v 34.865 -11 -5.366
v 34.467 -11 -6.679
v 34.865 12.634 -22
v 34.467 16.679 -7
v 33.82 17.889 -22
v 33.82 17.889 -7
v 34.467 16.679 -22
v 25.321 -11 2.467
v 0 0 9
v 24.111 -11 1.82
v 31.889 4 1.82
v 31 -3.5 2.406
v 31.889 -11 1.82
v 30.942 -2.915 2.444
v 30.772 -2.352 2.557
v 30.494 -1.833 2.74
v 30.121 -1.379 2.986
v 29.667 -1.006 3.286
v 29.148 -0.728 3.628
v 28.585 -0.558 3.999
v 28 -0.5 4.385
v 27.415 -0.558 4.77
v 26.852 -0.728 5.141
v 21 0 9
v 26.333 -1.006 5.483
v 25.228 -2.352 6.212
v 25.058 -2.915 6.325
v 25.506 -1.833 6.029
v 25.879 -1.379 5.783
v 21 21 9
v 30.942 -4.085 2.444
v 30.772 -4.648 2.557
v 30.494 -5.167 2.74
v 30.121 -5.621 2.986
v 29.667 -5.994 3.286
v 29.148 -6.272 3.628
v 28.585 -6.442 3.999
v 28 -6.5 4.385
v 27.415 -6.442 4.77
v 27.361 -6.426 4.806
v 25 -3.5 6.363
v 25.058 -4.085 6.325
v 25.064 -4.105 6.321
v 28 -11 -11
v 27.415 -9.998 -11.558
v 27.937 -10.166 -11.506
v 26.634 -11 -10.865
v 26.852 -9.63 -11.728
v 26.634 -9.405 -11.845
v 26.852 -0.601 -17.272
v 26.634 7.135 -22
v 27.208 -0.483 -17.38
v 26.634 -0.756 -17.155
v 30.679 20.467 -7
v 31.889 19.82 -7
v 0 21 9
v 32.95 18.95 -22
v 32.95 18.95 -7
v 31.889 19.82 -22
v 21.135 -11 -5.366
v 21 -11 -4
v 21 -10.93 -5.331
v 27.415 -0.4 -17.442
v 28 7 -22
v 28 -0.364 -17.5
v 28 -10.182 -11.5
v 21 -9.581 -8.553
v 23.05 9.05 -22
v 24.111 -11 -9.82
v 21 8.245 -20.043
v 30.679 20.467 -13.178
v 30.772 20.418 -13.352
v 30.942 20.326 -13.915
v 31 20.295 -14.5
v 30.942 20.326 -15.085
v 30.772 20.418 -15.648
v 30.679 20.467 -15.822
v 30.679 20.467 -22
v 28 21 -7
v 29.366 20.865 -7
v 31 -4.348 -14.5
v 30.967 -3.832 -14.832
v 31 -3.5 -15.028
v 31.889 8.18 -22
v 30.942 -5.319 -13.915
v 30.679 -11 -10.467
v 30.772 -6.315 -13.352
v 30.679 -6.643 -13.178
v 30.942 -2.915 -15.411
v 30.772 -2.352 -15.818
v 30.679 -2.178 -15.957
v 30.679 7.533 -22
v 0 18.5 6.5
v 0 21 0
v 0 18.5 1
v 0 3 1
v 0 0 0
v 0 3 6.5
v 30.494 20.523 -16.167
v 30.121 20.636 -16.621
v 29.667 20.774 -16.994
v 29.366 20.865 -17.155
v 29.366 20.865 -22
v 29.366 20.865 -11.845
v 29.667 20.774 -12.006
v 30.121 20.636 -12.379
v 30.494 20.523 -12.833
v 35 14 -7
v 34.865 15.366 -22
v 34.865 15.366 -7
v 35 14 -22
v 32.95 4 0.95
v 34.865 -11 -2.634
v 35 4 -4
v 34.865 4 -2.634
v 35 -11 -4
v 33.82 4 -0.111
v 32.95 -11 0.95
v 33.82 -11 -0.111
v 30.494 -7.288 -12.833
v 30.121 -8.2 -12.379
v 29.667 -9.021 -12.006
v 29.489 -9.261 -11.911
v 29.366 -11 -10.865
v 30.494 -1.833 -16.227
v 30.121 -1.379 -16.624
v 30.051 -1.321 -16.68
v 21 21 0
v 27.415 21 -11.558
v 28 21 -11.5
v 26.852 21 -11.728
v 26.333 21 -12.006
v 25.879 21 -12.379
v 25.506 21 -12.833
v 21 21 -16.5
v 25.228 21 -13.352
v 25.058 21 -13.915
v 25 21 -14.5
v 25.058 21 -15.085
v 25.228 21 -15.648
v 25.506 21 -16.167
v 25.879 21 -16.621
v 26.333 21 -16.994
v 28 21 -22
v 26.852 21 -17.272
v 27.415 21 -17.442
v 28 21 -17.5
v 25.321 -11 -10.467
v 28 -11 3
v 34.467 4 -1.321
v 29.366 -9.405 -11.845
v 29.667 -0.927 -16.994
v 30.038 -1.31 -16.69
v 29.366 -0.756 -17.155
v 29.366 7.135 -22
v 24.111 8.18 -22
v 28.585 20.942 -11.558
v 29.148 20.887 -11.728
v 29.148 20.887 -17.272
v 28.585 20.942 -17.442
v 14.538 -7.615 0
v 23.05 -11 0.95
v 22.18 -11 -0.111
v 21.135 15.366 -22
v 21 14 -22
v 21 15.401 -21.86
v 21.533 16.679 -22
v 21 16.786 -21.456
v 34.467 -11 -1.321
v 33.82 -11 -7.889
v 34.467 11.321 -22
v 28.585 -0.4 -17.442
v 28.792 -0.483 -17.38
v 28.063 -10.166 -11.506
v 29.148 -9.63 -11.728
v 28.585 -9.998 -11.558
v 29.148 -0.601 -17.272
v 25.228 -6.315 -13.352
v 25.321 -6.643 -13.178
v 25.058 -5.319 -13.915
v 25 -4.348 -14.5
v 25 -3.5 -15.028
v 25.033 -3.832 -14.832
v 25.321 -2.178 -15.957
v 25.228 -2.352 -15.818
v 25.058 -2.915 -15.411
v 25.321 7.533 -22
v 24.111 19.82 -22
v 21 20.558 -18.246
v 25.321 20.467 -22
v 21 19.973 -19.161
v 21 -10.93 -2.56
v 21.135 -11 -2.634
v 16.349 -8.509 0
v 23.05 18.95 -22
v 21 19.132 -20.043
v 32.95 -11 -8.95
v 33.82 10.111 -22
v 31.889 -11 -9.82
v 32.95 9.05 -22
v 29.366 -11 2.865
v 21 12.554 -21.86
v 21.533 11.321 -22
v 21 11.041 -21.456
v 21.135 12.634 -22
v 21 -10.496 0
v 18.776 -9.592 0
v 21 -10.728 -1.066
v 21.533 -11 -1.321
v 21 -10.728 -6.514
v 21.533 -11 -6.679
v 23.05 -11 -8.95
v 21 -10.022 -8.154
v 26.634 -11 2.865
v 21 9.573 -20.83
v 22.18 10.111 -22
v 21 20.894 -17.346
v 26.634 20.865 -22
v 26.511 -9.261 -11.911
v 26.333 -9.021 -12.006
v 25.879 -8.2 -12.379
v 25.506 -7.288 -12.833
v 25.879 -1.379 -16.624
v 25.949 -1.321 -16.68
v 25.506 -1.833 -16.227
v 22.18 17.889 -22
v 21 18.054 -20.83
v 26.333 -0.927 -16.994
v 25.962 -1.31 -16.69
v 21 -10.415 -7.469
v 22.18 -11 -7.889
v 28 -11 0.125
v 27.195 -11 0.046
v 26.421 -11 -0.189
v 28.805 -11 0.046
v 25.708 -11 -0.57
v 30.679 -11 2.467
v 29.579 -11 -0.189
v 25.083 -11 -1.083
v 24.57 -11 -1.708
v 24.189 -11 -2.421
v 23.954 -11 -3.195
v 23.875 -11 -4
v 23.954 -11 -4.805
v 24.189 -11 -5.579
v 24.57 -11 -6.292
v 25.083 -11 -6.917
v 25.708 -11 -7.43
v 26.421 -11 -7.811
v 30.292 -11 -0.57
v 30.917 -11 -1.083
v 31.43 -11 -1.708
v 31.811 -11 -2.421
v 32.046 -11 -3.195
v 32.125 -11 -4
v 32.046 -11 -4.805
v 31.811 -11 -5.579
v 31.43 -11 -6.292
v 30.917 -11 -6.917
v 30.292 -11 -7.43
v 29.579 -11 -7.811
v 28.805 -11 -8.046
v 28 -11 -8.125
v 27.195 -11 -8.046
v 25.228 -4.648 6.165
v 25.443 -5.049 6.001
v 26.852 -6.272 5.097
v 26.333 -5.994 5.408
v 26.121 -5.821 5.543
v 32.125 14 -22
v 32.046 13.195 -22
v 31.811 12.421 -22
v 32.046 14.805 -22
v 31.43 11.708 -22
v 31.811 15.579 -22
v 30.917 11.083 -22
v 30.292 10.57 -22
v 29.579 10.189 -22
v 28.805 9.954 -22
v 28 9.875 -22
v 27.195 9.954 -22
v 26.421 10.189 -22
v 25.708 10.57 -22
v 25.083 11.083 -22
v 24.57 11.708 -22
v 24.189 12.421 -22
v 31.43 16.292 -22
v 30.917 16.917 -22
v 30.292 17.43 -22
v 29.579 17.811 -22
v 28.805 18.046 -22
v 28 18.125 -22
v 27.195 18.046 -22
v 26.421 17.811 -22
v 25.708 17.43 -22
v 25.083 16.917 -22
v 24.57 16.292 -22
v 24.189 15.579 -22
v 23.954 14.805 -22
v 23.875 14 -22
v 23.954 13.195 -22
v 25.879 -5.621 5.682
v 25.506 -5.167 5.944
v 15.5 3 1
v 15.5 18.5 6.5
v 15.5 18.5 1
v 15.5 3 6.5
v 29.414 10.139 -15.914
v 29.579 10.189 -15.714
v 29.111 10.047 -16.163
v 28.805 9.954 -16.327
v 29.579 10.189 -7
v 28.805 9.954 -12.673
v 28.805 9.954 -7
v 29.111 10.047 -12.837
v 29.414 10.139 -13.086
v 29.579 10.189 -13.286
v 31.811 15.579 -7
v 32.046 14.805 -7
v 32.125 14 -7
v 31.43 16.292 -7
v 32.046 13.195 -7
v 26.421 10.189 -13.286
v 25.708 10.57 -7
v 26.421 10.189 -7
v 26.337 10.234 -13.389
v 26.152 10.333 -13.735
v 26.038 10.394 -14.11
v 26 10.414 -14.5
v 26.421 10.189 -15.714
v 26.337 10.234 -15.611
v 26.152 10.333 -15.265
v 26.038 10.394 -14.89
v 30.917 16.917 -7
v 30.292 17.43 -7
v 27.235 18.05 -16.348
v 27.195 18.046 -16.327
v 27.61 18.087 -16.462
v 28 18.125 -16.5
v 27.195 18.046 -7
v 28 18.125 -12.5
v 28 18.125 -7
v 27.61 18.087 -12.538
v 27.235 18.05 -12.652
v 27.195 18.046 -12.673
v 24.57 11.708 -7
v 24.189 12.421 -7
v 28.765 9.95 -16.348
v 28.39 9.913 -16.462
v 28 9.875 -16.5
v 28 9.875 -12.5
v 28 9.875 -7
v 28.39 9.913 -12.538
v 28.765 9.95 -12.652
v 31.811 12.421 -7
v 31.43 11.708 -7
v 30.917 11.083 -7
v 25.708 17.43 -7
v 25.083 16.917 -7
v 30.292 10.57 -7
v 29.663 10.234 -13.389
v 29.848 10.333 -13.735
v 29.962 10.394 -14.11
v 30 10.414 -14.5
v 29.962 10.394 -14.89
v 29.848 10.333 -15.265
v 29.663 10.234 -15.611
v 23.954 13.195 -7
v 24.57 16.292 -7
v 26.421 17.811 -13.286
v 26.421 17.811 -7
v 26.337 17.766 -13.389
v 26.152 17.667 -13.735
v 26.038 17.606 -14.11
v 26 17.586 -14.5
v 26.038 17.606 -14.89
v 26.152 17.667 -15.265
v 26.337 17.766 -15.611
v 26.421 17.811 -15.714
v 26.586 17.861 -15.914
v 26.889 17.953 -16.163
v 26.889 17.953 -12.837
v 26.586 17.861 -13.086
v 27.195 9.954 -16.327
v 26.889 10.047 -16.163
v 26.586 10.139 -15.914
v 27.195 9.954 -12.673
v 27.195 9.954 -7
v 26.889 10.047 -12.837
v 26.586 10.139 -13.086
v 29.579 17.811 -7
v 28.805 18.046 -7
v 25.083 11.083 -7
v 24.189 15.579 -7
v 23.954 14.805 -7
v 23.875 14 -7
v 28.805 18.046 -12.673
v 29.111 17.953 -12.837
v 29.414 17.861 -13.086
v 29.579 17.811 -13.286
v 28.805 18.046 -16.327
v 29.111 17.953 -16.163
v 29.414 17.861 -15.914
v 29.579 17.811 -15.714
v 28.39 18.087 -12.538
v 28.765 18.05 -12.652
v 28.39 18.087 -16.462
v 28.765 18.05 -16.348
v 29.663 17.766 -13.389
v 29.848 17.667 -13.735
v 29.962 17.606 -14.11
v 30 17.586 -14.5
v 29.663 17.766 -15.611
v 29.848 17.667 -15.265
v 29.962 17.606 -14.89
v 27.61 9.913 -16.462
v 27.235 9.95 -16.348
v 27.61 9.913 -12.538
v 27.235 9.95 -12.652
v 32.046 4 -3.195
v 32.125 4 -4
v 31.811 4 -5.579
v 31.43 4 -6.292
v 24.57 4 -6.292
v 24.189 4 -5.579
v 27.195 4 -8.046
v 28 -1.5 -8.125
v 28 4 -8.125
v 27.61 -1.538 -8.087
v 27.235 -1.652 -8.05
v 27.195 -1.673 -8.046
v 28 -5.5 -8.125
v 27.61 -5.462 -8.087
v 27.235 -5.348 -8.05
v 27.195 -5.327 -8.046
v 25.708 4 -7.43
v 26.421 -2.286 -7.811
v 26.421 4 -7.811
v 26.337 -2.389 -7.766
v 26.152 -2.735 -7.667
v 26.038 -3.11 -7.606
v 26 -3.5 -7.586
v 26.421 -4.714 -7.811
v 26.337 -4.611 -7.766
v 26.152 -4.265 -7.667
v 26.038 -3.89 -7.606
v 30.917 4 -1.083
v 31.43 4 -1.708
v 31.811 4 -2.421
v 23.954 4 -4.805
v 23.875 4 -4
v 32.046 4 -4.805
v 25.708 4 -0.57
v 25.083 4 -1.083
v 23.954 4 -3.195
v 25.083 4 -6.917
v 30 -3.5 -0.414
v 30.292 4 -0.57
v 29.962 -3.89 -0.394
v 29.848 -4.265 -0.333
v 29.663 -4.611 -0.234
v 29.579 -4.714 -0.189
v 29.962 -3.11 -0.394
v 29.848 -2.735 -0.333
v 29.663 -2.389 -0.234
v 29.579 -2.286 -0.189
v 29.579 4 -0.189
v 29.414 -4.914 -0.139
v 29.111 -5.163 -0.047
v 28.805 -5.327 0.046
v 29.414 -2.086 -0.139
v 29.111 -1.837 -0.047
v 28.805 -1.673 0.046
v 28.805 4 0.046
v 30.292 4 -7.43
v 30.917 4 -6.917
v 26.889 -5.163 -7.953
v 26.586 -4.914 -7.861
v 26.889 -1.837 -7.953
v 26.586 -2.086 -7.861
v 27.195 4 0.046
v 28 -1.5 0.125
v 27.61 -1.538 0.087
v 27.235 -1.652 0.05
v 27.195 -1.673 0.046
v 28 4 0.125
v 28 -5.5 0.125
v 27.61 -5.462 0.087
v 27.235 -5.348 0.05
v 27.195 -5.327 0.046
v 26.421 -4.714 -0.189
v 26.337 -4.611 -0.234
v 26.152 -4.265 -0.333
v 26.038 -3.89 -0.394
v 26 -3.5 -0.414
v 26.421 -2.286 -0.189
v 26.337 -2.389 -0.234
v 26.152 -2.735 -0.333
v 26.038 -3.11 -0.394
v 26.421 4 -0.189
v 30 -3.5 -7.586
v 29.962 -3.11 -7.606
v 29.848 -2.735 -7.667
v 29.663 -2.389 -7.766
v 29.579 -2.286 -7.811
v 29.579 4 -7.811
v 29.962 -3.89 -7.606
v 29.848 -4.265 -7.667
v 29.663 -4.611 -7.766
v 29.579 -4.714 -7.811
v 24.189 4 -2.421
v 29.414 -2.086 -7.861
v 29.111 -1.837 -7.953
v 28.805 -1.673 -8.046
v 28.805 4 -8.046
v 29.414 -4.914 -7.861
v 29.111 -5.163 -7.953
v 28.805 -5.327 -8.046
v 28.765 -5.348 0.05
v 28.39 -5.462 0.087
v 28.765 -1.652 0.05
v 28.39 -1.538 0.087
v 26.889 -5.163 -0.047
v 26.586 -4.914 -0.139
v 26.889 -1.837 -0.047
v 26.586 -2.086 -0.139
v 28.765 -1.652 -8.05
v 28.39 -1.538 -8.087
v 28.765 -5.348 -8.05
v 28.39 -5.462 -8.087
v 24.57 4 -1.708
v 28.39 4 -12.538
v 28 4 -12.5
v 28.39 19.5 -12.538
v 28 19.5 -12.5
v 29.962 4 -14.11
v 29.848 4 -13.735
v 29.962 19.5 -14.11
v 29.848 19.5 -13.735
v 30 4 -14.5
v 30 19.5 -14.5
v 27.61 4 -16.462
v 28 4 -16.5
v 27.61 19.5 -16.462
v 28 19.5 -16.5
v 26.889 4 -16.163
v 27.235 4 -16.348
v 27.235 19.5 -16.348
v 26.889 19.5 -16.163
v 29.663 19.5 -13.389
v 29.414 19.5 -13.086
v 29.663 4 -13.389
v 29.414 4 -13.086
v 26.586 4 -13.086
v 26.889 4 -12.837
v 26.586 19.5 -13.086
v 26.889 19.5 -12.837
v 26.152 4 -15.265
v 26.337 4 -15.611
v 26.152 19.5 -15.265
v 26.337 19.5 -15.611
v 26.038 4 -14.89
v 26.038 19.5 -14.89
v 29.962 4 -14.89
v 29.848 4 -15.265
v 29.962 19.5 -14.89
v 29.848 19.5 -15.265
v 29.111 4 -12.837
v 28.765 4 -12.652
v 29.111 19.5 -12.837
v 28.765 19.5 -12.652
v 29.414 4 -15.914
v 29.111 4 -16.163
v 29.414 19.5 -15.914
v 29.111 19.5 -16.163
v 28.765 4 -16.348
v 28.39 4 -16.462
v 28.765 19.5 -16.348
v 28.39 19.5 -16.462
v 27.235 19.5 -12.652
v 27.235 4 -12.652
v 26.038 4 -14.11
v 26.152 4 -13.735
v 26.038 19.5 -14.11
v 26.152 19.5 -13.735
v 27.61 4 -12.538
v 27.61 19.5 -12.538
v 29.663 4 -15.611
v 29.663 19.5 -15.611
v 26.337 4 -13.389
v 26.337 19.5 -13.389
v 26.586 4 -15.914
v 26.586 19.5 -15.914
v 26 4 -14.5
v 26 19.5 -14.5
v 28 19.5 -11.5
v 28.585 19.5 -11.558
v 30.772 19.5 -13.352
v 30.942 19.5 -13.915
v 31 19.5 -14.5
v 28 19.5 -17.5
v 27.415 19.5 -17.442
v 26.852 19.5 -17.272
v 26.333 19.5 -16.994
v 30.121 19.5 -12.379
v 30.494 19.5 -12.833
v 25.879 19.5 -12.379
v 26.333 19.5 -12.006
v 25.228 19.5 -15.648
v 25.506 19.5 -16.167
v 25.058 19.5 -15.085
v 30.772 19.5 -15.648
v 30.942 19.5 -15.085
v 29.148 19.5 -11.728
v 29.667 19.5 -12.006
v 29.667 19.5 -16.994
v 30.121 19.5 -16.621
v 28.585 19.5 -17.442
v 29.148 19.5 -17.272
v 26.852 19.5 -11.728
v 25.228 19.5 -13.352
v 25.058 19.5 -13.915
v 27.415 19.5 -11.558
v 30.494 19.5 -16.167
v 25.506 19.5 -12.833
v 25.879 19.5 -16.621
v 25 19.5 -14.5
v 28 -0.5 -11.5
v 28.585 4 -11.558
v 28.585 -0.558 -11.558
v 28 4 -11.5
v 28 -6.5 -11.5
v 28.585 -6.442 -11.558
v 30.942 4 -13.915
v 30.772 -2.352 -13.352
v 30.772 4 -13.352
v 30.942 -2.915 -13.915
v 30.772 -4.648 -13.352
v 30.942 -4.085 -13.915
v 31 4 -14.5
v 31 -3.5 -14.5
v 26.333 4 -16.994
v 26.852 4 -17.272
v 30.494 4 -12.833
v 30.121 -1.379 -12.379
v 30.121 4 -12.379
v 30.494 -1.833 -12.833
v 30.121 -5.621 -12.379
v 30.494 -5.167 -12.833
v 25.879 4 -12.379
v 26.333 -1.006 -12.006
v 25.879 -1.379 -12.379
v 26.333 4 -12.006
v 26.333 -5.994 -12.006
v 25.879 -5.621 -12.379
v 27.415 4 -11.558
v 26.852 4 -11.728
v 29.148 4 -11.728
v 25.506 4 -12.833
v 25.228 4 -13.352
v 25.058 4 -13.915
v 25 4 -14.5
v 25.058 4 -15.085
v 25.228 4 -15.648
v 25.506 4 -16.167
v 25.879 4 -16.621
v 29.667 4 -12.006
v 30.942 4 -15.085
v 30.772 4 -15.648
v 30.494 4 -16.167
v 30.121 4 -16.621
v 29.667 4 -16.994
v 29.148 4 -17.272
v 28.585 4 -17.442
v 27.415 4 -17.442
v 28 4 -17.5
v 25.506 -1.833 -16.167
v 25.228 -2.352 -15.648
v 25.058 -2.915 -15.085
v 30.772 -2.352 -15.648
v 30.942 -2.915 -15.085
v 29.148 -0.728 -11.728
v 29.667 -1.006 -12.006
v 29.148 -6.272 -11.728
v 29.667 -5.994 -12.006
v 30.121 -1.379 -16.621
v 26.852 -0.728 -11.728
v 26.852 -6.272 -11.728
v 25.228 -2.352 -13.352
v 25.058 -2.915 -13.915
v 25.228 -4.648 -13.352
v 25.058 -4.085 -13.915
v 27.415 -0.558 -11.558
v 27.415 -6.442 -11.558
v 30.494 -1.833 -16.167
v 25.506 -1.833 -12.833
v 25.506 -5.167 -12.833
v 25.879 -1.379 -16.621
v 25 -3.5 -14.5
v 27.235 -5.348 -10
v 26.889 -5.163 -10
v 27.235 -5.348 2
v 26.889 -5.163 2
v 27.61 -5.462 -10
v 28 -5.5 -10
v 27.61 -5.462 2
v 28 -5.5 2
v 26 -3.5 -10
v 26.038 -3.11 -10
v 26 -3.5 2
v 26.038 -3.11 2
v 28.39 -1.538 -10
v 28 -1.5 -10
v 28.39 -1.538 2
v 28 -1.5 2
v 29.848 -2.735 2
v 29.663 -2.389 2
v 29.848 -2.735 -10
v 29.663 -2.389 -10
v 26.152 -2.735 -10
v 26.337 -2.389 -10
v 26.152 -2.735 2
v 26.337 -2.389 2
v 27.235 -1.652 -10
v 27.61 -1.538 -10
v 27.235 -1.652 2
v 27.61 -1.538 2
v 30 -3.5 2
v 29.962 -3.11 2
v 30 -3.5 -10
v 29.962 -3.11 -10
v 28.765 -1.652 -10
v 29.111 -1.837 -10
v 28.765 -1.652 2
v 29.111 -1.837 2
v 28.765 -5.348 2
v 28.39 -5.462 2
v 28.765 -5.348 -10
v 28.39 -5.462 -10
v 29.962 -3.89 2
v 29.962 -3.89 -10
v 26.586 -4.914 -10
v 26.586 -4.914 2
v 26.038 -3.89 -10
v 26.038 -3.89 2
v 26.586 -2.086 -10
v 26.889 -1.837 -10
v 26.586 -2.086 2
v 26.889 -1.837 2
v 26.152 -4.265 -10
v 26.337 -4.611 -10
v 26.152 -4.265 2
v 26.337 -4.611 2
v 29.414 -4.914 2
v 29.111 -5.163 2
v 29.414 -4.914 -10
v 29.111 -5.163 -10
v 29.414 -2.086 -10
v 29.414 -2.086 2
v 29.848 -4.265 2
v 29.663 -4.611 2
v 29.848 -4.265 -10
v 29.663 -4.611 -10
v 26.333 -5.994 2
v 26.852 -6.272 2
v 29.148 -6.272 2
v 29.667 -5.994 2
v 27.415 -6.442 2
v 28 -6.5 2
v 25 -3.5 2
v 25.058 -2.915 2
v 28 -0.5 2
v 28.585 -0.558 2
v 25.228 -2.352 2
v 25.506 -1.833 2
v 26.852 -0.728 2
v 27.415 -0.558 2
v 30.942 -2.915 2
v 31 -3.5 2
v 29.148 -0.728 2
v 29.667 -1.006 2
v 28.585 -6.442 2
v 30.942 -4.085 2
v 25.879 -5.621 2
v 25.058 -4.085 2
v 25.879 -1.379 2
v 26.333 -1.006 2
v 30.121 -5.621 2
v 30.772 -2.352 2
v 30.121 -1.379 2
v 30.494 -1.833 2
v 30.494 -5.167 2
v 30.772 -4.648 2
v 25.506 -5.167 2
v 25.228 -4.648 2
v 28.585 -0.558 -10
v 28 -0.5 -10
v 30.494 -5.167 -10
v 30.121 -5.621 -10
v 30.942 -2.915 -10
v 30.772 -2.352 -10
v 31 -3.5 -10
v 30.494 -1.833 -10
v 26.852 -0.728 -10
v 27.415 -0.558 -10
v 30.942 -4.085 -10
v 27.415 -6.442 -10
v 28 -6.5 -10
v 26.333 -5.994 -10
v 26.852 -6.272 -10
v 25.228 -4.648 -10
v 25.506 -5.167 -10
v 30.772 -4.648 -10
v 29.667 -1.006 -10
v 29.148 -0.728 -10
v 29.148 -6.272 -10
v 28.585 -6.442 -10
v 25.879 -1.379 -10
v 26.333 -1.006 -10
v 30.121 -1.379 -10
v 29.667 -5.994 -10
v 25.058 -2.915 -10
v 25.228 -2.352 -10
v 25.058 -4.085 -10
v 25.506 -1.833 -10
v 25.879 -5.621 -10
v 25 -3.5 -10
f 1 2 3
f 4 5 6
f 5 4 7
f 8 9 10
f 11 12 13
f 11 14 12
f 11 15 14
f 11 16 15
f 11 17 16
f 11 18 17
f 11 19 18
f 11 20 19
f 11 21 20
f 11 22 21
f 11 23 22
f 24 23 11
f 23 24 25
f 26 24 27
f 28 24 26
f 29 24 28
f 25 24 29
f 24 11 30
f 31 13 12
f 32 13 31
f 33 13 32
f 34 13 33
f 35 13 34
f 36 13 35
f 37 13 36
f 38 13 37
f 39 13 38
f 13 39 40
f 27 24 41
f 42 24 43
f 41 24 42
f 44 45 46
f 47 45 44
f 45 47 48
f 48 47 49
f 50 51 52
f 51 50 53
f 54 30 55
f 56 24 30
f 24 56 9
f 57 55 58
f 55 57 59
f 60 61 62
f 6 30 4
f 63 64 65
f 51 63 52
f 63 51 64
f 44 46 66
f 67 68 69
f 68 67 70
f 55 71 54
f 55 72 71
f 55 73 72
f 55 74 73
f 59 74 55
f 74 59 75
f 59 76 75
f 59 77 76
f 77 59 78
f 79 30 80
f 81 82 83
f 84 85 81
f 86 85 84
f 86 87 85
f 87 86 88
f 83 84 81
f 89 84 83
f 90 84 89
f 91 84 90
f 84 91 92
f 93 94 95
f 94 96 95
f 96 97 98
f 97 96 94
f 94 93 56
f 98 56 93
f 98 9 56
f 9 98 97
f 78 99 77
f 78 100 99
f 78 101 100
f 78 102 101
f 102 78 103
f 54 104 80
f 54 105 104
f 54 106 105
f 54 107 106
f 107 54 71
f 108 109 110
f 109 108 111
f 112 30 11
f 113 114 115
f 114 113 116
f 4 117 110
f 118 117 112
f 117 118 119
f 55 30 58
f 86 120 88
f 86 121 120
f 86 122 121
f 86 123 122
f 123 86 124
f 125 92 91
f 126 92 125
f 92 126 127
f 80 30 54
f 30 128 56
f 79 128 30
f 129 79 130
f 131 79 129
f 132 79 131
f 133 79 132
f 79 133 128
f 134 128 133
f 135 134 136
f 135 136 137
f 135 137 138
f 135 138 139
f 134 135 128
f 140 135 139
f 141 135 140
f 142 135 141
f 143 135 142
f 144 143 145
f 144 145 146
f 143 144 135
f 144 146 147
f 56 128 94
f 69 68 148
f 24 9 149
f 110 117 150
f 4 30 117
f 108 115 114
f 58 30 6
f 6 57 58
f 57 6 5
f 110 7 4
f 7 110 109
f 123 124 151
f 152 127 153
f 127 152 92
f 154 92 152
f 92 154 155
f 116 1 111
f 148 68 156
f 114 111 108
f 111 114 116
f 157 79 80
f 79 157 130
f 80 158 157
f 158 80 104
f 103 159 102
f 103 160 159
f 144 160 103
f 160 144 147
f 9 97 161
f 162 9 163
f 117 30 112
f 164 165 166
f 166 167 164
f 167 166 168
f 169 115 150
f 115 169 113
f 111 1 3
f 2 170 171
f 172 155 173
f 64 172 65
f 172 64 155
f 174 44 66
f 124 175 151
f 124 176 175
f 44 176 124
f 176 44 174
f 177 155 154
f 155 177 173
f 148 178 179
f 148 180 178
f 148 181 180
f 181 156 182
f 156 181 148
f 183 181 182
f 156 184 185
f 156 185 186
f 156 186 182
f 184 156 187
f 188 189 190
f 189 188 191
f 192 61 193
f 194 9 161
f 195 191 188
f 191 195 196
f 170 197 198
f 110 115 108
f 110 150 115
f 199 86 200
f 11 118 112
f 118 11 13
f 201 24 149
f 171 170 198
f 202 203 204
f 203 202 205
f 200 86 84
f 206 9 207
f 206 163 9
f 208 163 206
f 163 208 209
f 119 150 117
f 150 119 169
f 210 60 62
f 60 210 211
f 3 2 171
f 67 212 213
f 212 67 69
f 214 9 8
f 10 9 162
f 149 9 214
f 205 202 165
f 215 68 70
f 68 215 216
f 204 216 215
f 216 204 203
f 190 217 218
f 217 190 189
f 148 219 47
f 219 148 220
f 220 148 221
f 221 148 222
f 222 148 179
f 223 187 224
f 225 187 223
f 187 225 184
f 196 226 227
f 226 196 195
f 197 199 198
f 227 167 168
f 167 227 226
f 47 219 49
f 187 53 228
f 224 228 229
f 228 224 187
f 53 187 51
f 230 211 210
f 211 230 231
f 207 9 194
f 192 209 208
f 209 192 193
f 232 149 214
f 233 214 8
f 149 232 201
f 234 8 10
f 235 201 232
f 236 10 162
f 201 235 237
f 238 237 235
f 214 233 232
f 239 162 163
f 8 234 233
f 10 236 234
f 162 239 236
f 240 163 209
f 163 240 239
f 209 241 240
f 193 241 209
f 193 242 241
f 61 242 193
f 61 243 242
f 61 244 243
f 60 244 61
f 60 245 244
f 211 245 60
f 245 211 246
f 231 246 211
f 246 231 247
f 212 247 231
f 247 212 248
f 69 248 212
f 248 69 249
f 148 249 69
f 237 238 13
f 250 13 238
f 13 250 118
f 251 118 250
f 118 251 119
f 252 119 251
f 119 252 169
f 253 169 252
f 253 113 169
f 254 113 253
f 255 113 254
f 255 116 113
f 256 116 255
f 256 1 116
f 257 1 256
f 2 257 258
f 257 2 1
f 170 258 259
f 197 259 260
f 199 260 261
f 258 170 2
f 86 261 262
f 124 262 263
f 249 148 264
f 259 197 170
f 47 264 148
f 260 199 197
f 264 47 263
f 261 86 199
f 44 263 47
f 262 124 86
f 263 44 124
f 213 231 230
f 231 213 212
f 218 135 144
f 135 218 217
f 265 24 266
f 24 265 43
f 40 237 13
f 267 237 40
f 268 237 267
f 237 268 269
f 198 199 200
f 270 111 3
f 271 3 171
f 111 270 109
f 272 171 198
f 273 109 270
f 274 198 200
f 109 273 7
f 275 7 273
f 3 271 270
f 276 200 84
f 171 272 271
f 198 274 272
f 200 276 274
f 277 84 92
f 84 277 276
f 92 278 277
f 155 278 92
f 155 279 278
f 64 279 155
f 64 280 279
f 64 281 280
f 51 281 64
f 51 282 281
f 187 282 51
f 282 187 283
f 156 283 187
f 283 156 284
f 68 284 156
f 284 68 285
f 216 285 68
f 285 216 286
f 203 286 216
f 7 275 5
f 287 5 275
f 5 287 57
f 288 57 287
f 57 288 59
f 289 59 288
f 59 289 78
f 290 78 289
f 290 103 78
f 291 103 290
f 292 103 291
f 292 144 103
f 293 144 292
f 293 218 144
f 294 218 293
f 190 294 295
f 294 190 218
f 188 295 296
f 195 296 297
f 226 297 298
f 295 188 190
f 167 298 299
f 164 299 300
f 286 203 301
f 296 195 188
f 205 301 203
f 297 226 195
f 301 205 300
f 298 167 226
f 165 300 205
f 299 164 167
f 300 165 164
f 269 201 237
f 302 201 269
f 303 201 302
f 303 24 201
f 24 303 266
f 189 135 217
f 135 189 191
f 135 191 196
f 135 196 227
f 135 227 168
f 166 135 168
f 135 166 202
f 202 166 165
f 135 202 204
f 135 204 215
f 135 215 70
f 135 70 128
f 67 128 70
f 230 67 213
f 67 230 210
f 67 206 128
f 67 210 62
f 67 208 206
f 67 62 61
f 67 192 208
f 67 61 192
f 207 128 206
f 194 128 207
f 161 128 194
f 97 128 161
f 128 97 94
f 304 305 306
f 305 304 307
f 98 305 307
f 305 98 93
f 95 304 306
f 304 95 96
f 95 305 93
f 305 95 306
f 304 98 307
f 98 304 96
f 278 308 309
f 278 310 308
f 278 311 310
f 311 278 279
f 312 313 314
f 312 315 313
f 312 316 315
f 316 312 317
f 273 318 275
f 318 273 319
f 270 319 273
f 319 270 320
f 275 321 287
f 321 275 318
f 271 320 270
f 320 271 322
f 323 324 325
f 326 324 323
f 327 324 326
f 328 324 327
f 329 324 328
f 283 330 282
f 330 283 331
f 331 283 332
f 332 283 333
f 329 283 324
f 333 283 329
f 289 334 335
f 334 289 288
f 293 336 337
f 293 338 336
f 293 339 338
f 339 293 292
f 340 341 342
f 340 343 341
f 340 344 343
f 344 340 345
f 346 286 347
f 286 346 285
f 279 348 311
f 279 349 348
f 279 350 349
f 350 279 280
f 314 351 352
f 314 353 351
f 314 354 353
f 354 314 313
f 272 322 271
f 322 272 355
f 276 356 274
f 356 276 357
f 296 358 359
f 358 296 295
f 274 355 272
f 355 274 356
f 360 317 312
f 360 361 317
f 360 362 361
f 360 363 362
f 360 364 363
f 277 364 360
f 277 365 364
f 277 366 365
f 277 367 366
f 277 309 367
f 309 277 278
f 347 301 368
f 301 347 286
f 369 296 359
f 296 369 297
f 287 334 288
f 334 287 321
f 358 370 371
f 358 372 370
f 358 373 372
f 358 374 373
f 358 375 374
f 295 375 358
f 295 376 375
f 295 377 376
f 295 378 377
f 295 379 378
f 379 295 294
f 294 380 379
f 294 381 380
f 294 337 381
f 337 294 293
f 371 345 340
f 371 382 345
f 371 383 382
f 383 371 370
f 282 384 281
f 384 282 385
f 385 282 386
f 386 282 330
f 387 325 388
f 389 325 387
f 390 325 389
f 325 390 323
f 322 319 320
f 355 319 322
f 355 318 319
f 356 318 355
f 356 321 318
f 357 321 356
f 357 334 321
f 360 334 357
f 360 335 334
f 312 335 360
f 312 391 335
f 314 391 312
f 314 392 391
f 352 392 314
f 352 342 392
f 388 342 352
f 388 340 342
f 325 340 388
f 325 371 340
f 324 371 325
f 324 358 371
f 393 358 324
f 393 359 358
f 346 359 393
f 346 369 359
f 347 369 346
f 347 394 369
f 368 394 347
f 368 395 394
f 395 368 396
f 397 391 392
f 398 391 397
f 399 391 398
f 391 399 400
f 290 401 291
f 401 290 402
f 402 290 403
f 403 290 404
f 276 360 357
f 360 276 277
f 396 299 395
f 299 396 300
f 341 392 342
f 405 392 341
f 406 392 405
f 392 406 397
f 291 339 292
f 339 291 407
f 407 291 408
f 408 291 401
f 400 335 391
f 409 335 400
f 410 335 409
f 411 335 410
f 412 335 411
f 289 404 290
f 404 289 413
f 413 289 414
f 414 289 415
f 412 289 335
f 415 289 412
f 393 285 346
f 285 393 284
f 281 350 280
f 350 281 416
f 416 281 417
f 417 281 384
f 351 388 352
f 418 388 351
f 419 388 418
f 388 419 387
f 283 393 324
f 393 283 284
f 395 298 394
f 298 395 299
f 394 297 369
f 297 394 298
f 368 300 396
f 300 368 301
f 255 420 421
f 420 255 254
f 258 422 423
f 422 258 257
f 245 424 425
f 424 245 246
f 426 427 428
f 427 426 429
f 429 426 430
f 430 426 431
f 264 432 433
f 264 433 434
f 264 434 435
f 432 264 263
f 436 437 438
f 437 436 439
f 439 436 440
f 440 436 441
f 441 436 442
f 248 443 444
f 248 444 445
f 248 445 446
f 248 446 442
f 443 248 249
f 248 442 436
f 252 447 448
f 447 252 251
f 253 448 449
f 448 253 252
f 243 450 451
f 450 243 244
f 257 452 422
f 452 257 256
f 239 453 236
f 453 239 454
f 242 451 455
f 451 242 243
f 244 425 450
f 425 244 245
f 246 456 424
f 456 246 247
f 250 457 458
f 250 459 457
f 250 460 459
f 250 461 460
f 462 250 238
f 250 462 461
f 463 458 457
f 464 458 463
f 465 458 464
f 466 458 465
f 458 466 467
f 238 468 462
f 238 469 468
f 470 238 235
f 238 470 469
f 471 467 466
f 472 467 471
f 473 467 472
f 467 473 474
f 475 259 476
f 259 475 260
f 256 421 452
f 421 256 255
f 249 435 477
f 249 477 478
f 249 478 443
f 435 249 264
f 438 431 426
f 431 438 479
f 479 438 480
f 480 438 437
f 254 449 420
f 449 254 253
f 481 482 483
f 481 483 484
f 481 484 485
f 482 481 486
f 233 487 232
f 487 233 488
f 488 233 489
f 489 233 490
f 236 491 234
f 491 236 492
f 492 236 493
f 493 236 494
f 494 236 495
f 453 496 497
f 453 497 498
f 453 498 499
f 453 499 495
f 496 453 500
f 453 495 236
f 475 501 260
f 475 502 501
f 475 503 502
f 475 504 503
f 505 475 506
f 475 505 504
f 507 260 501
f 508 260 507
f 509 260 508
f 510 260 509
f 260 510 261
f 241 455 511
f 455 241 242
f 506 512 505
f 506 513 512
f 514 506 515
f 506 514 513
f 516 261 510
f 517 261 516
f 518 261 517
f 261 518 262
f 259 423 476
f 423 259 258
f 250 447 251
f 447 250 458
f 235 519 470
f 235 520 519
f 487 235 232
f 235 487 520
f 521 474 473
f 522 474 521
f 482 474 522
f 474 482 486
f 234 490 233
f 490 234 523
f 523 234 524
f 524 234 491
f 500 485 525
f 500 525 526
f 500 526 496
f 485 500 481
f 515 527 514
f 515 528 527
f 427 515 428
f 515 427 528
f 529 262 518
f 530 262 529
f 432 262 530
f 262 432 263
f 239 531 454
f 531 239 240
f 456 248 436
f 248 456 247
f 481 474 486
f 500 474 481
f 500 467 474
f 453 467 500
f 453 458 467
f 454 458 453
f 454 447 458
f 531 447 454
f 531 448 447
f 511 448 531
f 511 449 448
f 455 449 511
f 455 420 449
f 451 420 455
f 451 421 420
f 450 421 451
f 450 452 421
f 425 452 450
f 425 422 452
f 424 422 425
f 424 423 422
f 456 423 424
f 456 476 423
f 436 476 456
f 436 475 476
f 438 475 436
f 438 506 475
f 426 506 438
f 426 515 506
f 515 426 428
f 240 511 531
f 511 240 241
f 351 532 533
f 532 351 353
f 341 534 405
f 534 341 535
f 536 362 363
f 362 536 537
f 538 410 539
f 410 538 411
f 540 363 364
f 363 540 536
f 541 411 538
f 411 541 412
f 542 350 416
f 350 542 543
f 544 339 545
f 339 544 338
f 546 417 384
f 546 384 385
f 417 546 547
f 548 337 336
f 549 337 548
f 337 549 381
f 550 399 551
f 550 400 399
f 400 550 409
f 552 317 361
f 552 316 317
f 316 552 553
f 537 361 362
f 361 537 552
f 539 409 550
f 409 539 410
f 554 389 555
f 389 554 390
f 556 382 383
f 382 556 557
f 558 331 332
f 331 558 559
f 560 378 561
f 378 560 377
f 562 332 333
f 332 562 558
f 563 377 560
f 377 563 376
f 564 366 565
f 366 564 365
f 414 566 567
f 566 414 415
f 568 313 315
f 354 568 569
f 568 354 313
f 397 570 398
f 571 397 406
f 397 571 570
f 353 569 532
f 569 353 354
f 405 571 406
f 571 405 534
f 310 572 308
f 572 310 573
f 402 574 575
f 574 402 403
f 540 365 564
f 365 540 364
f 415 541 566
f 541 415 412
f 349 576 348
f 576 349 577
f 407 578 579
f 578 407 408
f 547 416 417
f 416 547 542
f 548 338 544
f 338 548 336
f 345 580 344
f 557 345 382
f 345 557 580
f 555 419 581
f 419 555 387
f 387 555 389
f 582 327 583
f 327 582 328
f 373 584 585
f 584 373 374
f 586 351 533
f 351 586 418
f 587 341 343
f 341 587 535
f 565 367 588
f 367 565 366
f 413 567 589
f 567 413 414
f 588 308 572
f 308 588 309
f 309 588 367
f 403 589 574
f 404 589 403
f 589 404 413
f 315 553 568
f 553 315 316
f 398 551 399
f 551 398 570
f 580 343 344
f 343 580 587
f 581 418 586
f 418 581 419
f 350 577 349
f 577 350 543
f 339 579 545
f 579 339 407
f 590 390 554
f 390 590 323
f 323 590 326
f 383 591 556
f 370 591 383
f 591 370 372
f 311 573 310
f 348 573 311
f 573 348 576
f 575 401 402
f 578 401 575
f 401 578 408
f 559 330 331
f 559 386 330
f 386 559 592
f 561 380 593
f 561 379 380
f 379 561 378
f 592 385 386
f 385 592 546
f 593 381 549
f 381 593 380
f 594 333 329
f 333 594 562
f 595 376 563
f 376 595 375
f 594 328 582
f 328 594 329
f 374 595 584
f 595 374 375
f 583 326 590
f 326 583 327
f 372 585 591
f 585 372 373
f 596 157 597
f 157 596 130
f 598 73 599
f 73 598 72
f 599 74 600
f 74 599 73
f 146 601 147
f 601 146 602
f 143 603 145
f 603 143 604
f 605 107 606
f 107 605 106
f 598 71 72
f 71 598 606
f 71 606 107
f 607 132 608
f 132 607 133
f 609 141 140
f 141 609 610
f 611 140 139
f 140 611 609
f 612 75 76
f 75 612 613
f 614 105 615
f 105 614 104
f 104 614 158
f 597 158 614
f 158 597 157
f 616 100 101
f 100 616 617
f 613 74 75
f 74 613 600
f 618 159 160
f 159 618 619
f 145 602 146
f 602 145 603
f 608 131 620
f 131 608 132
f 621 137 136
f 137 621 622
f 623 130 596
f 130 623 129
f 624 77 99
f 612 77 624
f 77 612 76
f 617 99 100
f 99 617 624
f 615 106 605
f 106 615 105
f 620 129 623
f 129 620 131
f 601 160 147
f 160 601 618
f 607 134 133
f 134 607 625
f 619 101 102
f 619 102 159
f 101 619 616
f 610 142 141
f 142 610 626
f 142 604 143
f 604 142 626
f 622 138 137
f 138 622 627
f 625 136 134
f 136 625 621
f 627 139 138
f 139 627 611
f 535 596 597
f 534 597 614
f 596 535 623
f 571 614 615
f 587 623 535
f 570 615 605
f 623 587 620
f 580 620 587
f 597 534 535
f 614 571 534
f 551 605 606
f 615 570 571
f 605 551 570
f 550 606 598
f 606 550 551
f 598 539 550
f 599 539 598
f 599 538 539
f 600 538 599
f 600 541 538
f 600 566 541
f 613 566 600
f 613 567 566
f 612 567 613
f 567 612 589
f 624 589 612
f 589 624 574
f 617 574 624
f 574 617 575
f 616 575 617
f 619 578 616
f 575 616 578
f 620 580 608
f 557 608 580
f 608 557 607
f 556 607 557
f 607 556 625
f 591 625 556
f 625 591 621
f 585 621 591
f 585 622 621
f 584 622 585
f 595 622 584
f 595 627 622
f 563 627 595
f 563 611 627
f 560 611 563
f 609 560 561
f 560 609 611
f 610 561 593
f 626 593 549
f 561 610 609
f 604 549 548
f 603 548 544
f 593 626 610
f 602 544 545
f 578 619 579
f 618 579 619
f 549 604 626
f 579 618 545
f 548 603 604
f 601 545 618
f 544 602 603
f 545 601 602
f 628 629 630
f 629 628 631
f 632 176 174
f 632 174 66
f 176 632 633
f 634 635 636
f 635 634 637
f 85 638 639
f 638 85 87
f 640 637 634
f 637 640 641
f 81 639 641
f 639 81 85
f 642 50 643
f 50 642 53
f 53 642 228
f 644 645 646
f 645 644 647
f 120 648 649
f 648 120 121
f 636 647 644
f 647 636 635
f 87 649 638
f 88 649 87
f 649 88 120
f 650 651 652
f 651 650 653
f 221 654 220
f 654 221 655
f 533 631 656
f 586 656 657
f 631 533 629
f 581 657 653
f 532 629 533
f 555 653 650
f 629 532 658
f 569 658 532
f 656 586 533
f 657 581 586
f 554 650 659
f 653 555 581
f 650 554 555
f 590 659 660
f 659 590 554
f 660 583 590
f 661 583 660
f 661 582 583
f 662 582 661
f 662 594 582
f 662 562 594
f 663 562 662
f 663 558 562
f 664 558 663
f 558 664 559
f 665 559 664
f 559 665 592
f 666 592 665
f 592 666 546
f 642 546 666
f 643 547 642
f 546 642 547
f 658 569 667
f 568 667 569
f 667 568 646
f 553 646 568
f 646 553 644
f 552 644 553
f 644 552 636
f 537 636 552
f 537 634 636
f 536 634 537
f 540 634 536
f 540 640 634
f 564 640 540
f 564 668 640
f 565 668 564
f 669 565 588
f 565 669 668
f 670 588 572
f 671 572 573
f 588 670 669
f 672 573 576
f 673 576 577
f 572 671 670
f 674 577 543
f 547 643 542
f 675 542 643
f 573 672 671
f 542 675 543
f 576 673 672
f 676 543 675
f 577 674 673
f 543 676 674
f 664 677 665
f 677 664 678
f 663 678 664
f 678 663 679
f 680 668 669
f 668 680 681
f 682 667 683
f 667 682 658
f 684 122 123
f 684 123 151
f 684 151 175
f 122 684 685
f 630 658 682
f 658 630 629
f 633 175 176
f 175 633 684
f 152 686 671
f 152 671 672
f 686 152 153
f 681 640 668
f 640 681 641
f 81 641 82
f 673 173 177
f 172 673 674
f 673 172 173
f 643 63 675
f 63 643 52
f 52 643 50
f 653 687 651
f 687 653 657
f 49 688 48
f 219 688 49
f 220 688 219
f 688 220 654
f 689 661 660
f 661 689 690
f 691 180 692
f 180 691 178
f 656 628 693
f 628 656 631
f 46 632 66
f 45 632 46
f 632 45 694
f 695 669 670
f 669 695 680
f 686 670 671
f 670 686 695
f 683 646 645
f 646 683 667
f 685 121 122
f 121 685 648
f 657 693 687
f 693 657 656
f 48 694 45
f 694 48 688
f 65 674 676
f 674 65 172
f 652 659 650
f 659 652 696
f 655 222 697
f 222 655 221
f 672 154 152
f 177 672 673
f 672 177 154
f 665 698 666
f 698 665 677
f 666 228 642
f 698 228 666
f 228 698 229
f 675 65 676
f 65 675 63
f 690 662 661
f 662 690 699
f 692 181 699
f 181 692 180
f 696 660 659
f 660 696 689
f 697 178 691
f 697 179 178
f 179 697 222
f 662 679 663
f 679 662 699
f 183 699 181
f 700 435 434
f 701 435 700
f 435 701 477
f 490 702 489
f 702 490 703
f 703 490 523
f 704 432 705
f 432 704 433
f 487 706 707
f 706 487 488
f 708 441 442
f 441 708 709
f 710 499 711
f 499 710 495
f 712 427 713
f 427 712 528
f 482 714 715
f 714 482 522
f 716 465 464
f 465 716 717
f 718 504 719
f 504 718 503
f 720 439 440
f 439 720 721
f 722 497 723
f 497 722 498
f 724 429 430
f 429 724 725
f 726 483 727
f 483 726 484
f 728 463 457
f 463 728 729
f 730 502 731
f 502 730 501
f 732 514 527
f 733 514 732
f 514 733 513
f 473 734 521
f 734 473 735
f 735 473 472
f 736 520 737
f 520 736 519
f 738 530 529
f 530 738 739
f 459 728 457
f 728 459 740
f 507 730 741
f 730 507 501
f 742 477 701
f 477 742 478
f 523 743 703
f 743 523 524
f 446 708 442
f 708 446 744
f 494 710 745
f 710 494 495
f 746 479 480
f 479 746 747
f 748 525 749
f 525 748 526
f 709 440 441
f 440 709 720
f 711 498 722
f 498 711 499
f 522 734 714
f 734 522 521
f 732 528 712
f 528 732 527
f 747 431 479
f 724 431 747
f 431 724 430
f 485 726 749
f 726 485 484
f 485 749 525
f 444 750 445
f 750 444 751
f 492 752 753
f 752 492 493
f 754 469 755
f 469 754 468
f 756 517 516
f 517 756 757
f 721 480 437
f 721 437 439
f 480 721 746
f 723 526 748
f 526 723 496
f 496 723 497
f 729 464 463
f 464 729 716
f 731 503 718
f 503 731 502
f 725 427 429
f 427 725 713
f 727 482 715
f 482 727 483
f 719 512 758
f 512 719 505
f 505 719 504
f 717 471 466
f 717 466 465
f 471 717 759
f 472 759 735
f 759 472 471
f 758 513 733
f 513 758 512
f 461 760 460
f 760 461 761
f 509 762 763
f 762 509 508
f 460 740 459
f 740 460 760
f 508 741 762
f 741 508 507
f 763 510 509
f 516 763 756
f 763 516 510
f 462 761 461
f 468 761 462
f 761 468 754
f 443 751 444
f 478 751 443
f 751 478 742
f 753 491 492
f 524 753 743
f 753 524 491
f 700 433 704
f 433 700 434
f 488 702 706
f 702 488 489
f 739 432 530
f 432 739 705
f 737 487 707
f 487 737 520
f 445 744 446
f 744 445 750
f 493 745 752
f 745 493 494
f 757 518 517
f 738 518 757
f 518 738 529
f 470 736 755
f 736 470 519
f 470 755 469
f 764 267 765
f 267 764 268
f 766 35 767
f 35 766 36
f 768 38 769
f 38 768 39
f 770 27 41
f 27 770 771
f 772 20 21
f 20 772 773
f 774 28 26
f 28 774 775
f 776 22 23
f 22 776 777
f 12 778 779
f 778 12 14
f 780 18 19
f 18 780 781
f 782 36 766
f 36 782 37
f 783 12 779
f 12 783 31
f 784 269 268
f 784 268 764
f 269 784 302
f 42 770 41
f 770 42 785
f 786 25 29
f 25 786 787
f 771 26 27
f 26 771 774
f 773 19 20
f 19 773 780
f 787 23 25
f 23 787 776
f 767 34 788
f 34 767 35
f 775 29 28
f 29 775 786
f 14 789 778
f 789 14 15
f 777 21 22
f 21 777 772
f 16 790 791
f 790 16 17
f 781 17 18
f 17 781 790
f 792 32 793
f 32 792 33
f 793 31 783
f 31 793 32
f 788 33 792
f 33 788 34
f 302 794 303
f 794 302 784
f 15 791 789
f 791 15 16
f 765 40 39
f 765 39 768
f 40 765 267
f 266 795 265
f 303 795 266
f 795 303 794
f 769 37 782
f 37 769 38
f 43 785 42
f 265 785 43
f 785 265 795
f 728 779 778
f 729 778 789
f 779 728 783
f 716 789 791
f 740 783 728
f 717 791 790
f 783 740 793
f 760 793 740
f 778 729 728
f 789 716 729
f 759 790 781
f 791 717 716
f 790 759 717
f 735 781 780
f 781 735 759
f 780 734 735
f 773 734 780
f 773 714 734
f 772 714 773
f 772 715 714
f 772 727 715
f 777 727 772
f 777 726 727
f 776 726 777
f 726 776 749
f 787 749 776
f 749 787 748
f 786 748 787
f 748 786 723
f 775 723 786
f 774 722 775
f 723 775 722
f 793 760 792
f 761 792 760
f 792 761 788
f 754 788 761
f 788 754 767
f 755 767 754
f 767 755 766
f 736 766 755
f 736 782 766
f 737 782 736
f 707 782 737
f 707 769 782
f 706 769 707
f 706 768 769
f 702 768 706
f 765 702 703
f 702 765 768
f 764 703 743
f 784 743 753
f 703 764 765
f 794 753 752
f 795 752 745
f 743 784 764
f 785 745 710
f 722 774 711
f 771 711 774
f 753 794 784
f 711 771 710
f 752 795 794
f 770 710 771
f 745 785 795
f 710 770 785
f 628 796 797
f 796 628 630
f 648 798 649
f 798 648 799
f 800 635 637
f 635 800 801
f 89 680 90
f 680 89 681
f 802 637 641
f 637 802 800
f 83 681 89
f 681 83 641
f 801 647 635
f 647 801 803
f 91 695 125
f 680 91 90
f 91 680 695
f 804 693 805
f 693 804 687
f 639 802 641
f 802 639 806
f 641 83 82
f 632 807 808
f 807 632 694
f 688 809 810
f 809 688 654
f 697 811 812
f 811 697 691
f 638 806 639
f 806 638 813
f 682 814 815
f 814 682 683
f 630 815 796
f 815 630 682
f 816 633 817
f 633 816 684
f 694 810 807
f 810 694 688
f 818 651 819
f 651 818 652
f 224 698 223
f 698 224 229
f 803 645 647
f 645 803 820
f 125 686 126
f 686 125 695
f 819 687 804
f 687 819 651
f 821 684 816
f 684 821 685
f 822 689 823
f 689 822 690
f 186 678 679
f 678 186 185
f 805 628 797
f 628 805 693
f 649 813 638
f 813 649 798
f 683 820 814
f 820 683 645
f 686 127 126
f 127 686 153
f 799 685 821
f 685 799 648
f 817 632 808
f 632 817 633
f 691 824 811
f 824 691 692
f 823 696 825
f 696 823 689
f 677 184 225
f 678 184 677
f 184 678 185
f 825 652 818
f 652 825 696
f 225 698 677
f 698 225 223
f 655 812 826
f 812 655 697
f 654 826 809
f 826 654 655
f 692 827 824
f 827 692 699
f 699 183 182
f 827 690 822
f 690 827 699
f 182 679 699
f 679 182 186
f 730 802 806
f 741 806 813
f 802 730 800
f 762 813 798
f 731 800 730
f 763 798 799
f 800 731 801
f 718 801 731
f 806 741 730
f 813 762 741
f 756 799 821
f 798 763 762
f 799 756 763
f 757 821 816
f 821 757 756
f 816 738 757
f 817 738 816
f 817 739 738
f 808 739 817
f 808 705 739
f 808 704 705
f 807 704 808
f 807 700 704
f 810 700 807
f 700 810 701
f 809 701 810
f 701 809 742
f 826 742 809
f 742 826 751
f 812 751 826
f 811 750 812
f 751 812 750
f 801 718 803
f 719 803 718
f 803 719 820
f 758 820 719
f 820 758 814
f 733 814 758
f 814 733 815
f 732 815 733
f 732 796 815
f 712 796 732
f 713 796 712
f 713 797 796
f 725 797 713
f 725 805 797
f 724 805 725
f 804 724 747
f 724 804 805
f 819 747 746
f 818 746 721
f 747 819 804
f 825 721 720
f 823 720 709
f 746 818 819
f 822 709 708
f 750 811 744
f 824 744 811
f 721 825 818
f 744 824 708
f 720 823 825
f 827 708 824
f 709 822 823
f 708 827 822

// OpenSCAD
// Global constants
$fn=32;
D = 0.125;
D2 = D * 2;
D4 = D * 4;

// Input Parameters
magW = 15;
magH = 5;
wallW = 3;
tubeR = 4;
boltRadius = 2;
boltHeadRadius = 3;

// Selected module call
//hook(tubeR);
upperConnector(magW, magH, wallW, tubeR);
//lowerConnector(magW, magH, wallW, tubeR);

module lowerConnector(magnetWidth, magnetHeight, magnetWall, tubeRadius) {
    difference() {
        tubeShellW = 3;
        tubeHoleL = 10;
        magThinWallH = 1;
        hullShapeHeight = 1;
        magWithDoubleWall = magnetWidth + magnetWall * 2;
        tubeWithShell = tubeRadius + tubeShellW;
        
        hull() {
            // box for magnet
            cube([magWithDoubleWall, magWithDoubleWall, magnetHeight + magnetWall + magThinWallH]);
            
            // cyllinder box for tube #1
            translate([magWithDoubleWall, (magWithDoubleWall)/2, tubeWithShell])
                rotate([0, 90, 0])  {
                    cylinder(r=tubeWithShell, h=tubeHoleL);
                };
            // bottom shape for hull #1
            translate([magWithDoubleWall, 0, 0])
                cube([tubeHoleL, magWithDoubleWall, hullShapeHeight]);
                
            // cyllinder box for tube #2
            translate([(magWithDoubleWall)/2, magWithDoubleWall + tubeHoleL, tubeWithShell])
                rotate([90, 0, 0])  {
                    cylinder(r=tubeWithShell, h=tubeHoleL);
                };
            // bottom shape for hull #2
            translate([0, magWithDoubleWall, 0])
                cube([magWithDoubleWall, tubeHoleL, hullShapeHeight]);
        };
        
        // magnet hole
        translate([magnetWall, 0, magThinWallH])
            cube([magnetWidth + D4, magnetWidth + D4, magnetHeight + D4]);
        
        // tube hole #1
        translate([magWithDoubleWall, (magWithDoubleWall)/2, tubeWithShell])
            rotate([0, 90, 0])  {
                cylinder(r=tubeRadius + D, h=tubeHoleL);
            };
            
        // tube hole #2
        translate([(magWithDoubleWall)/2, magWithDoubleWall, tubeWithShell])
            rotate([-90, 0, 0])  {
                cylinder(r=tubeRadius + D, h=tubeHoleL);
            };
            
        // bolt hole #1
        translate([magWithDoubleWall + tubeHoleL/2, 0, tubeWithShell]) 
            rotate([-90, 0, 0]) {
                cylinder(r=boltRadius, h=1000);
            }
        // bolt header holes #1
        translate([magWithDoubleWall + tubeHoleL/2, 0, tubeWithShell]) 
            rotate([-90, 0, 0]) {
                cylinder(r=boltHeadRadius, h=3);
            }
        translate([magWithDoubleWall + tubeHoleL/2, magWithDoubleWall + tubeHoleL, tubeWithShell]) 
            rotate([90, 0, 0]) {
                cylinder(r=boltHeadRadius, h=12);
            }
        // bolt hole #2
        translate([0, magWithDoubleWall + tubeHoleL/2, tubeWithShell]) 
            rotate([0, 90, 0]) {
                cylinder(r=boltRadius, h=1000);
            }
        // bolt header holes #2
        translate([0, magWithDoubleWall + tubeHoleL/2, tubeWithShell]) 
            rotate([0, 90, 0]) {
                cylinder(r=boltHeadRadius, h=3);
            }
        translate([magWithDoubleWall + tubeHoleL, magWithDoubleWall + tubeHoleL/2, tubeWithShell]) 
            rotate([0, -90, 0]) {
                cylinder(r=boltHeadRadius, h=12);
            }
    }
}

module upperConnector(magnetWidth, magnetHeight, magnetWall, tubeRadius) {
    tubeShellW = 3;
    tubeHoleL = 15;
    magThinWallH = 1;
    magWithDoubleWall = magnetWidth + magnetWall * 2;
    tubeWithShell = tubeRadius + tubeShellW;
    
    difference() {
        hull() {
            // box for magnet
            cube([magWithDoubleWall, magWithDoubleWall, magnetHeight + magnetWall + magThinWallH]);
            
            hull() {
                // cyllinder box for tube #1
                translate([magWithDoubleWall + tubeWithShell, tubeWithShell + (magWithDoubleWall-tubeWithShell)/2, 0 -  
                    tubeHoleL - tubeWithShell])
                    cylinder(r=tubeWithShell, h=tubeHoleL);
                    
                // cyllinder box for tube #2
                translate([magWithDoubleWall + tubeWithShell, tubeWithShell - magnetWall, 0 - tubeRadius])
                    rotate([90, 0, 0])  {
                        cylinder(r=tubeWithShell, h=tubeHoleL);
                    }
            }
        }
        // need to cut corner after hull
        translate([0, - 20, - tubeHoleL - tubeWithShell]) 
            cube([magWithDoubleWall, 20*3, tubeHoleL + tubeWithShell]);
        // magnet hole
        translate([0, magnetWall, magThinWallH])
            cube([magnetWidth + D4, magnetWidth + D4, magnetHeight + D4]);
        // tube hole #1
        translate([magWithDoubleWall + tubeWithShell, tubeWithShell + (magWithDoubleWall-tubeWithShell)/2, 0 -  
                    tubeHoleL - tubeWithShell])
            cylinder(r=tubeRadius + D, h=tubeHoleL);
        // tube hole #2
        translate([magWithDoubleWall + tubeWithShell, tubeWithShell - magnetWall, - tubeRadius])
            rotate([90, 0, 0])  {
                cylinder(r=tubeRadius + D, h=tubeHoleL);
            }

        // bolt hole #1
        translate([magWithDoubleWall + tubeWithShell, magWithDoubleWall, 0 - tubeHoleL/2 - tubeWithShell]) 
            rotate([90, 0, 0]) {
                cylinder(r=boltRadius, h=1000);
            }
            
        // bolt header holes #1
        translate([magWithDoubleWall + tubeWithShell, magWithDoubleWall, 0 - tubeHoleL/2 - tubeWithShell]) 
            rotate([90, 0, 0]) {
                cylinder(r=boltHeadRadius, h=1.5);
            }
        translate([magWithDoubleWall + tubeWithShell, 
            tubeWithShell - magnetWall, 0 - tubeHoleL/2 - tubeWithShell]) 
            rotate([90, 0, 0]) {
                cylinder(r=boltHeadRadius, h=1000);
            }

        // bolt hole #2
        translate([magWithDoubleWall + tubeWithShell, tubeWithShell - magnetWall - tubeHoleL/2, magH + wallW + magThinWallH]) 
            rotate([0, 180, 0]) {
                cylinder(r=boltRadius, h=1000);
            }
            
        // bolt header holes #2
        translate([magWithDoubleWall + tubeWithShell, tubeWithShell - magnetWall - tubeHoleL/2, magH + wallW + magThinWallH]) 
            rotate([0, 180, 0]) {
                cylinder(r=boltHeadRadius, h=7);
            }
        translate([magWithDoubleWall + tubeWithShell, tubeWithShell - magnetWall - tubeHoleL/2, 0 - tubeHoleL - tubeWithShell]) 
            cylinder(r=boltHeadRadius, h=12);
            
    }
}

module hook(tubeRadius) {
    legL = 35;
    hookW = 5;
    hookTubeOuterR = 11;
    hookTubeInnerR = 8;
    tubeWall = 1.25;
    tubeOuterR = tubeRadius + D2 + tubeWall;
    
    // tube circle
    difference() {
        cylinder(r=tubeOuterR, h=hookW);
        cylinder(r=tubeRadius + D2, h=hookW);
    }
    // leg 
    linear_extrude(hookW) {
        polygon(points=[
            [0, tubeRadius + D2], 
            [0, tubeOuterR], 
            [legL, - tubeOuterR + hookTubeOuterR], 
            [legL, - tubeOuterR + hookTubeInnerR]]);
    }
    // hook
    translate([legL, - tubeOuterR, 0]) 
        difference() {
            cylinder(r=hookTubeOuterR, h=hookW);
            cylinder(r=hookTubeInnerR, h=hookW);
            translate([- hookTubeOuterR*2, -hookTubeOuterR, 0]) 
                cube([hookTubeOuterR*2, hookTubeOuterR*2, hookTubeOuterR*2]);
        }
}
